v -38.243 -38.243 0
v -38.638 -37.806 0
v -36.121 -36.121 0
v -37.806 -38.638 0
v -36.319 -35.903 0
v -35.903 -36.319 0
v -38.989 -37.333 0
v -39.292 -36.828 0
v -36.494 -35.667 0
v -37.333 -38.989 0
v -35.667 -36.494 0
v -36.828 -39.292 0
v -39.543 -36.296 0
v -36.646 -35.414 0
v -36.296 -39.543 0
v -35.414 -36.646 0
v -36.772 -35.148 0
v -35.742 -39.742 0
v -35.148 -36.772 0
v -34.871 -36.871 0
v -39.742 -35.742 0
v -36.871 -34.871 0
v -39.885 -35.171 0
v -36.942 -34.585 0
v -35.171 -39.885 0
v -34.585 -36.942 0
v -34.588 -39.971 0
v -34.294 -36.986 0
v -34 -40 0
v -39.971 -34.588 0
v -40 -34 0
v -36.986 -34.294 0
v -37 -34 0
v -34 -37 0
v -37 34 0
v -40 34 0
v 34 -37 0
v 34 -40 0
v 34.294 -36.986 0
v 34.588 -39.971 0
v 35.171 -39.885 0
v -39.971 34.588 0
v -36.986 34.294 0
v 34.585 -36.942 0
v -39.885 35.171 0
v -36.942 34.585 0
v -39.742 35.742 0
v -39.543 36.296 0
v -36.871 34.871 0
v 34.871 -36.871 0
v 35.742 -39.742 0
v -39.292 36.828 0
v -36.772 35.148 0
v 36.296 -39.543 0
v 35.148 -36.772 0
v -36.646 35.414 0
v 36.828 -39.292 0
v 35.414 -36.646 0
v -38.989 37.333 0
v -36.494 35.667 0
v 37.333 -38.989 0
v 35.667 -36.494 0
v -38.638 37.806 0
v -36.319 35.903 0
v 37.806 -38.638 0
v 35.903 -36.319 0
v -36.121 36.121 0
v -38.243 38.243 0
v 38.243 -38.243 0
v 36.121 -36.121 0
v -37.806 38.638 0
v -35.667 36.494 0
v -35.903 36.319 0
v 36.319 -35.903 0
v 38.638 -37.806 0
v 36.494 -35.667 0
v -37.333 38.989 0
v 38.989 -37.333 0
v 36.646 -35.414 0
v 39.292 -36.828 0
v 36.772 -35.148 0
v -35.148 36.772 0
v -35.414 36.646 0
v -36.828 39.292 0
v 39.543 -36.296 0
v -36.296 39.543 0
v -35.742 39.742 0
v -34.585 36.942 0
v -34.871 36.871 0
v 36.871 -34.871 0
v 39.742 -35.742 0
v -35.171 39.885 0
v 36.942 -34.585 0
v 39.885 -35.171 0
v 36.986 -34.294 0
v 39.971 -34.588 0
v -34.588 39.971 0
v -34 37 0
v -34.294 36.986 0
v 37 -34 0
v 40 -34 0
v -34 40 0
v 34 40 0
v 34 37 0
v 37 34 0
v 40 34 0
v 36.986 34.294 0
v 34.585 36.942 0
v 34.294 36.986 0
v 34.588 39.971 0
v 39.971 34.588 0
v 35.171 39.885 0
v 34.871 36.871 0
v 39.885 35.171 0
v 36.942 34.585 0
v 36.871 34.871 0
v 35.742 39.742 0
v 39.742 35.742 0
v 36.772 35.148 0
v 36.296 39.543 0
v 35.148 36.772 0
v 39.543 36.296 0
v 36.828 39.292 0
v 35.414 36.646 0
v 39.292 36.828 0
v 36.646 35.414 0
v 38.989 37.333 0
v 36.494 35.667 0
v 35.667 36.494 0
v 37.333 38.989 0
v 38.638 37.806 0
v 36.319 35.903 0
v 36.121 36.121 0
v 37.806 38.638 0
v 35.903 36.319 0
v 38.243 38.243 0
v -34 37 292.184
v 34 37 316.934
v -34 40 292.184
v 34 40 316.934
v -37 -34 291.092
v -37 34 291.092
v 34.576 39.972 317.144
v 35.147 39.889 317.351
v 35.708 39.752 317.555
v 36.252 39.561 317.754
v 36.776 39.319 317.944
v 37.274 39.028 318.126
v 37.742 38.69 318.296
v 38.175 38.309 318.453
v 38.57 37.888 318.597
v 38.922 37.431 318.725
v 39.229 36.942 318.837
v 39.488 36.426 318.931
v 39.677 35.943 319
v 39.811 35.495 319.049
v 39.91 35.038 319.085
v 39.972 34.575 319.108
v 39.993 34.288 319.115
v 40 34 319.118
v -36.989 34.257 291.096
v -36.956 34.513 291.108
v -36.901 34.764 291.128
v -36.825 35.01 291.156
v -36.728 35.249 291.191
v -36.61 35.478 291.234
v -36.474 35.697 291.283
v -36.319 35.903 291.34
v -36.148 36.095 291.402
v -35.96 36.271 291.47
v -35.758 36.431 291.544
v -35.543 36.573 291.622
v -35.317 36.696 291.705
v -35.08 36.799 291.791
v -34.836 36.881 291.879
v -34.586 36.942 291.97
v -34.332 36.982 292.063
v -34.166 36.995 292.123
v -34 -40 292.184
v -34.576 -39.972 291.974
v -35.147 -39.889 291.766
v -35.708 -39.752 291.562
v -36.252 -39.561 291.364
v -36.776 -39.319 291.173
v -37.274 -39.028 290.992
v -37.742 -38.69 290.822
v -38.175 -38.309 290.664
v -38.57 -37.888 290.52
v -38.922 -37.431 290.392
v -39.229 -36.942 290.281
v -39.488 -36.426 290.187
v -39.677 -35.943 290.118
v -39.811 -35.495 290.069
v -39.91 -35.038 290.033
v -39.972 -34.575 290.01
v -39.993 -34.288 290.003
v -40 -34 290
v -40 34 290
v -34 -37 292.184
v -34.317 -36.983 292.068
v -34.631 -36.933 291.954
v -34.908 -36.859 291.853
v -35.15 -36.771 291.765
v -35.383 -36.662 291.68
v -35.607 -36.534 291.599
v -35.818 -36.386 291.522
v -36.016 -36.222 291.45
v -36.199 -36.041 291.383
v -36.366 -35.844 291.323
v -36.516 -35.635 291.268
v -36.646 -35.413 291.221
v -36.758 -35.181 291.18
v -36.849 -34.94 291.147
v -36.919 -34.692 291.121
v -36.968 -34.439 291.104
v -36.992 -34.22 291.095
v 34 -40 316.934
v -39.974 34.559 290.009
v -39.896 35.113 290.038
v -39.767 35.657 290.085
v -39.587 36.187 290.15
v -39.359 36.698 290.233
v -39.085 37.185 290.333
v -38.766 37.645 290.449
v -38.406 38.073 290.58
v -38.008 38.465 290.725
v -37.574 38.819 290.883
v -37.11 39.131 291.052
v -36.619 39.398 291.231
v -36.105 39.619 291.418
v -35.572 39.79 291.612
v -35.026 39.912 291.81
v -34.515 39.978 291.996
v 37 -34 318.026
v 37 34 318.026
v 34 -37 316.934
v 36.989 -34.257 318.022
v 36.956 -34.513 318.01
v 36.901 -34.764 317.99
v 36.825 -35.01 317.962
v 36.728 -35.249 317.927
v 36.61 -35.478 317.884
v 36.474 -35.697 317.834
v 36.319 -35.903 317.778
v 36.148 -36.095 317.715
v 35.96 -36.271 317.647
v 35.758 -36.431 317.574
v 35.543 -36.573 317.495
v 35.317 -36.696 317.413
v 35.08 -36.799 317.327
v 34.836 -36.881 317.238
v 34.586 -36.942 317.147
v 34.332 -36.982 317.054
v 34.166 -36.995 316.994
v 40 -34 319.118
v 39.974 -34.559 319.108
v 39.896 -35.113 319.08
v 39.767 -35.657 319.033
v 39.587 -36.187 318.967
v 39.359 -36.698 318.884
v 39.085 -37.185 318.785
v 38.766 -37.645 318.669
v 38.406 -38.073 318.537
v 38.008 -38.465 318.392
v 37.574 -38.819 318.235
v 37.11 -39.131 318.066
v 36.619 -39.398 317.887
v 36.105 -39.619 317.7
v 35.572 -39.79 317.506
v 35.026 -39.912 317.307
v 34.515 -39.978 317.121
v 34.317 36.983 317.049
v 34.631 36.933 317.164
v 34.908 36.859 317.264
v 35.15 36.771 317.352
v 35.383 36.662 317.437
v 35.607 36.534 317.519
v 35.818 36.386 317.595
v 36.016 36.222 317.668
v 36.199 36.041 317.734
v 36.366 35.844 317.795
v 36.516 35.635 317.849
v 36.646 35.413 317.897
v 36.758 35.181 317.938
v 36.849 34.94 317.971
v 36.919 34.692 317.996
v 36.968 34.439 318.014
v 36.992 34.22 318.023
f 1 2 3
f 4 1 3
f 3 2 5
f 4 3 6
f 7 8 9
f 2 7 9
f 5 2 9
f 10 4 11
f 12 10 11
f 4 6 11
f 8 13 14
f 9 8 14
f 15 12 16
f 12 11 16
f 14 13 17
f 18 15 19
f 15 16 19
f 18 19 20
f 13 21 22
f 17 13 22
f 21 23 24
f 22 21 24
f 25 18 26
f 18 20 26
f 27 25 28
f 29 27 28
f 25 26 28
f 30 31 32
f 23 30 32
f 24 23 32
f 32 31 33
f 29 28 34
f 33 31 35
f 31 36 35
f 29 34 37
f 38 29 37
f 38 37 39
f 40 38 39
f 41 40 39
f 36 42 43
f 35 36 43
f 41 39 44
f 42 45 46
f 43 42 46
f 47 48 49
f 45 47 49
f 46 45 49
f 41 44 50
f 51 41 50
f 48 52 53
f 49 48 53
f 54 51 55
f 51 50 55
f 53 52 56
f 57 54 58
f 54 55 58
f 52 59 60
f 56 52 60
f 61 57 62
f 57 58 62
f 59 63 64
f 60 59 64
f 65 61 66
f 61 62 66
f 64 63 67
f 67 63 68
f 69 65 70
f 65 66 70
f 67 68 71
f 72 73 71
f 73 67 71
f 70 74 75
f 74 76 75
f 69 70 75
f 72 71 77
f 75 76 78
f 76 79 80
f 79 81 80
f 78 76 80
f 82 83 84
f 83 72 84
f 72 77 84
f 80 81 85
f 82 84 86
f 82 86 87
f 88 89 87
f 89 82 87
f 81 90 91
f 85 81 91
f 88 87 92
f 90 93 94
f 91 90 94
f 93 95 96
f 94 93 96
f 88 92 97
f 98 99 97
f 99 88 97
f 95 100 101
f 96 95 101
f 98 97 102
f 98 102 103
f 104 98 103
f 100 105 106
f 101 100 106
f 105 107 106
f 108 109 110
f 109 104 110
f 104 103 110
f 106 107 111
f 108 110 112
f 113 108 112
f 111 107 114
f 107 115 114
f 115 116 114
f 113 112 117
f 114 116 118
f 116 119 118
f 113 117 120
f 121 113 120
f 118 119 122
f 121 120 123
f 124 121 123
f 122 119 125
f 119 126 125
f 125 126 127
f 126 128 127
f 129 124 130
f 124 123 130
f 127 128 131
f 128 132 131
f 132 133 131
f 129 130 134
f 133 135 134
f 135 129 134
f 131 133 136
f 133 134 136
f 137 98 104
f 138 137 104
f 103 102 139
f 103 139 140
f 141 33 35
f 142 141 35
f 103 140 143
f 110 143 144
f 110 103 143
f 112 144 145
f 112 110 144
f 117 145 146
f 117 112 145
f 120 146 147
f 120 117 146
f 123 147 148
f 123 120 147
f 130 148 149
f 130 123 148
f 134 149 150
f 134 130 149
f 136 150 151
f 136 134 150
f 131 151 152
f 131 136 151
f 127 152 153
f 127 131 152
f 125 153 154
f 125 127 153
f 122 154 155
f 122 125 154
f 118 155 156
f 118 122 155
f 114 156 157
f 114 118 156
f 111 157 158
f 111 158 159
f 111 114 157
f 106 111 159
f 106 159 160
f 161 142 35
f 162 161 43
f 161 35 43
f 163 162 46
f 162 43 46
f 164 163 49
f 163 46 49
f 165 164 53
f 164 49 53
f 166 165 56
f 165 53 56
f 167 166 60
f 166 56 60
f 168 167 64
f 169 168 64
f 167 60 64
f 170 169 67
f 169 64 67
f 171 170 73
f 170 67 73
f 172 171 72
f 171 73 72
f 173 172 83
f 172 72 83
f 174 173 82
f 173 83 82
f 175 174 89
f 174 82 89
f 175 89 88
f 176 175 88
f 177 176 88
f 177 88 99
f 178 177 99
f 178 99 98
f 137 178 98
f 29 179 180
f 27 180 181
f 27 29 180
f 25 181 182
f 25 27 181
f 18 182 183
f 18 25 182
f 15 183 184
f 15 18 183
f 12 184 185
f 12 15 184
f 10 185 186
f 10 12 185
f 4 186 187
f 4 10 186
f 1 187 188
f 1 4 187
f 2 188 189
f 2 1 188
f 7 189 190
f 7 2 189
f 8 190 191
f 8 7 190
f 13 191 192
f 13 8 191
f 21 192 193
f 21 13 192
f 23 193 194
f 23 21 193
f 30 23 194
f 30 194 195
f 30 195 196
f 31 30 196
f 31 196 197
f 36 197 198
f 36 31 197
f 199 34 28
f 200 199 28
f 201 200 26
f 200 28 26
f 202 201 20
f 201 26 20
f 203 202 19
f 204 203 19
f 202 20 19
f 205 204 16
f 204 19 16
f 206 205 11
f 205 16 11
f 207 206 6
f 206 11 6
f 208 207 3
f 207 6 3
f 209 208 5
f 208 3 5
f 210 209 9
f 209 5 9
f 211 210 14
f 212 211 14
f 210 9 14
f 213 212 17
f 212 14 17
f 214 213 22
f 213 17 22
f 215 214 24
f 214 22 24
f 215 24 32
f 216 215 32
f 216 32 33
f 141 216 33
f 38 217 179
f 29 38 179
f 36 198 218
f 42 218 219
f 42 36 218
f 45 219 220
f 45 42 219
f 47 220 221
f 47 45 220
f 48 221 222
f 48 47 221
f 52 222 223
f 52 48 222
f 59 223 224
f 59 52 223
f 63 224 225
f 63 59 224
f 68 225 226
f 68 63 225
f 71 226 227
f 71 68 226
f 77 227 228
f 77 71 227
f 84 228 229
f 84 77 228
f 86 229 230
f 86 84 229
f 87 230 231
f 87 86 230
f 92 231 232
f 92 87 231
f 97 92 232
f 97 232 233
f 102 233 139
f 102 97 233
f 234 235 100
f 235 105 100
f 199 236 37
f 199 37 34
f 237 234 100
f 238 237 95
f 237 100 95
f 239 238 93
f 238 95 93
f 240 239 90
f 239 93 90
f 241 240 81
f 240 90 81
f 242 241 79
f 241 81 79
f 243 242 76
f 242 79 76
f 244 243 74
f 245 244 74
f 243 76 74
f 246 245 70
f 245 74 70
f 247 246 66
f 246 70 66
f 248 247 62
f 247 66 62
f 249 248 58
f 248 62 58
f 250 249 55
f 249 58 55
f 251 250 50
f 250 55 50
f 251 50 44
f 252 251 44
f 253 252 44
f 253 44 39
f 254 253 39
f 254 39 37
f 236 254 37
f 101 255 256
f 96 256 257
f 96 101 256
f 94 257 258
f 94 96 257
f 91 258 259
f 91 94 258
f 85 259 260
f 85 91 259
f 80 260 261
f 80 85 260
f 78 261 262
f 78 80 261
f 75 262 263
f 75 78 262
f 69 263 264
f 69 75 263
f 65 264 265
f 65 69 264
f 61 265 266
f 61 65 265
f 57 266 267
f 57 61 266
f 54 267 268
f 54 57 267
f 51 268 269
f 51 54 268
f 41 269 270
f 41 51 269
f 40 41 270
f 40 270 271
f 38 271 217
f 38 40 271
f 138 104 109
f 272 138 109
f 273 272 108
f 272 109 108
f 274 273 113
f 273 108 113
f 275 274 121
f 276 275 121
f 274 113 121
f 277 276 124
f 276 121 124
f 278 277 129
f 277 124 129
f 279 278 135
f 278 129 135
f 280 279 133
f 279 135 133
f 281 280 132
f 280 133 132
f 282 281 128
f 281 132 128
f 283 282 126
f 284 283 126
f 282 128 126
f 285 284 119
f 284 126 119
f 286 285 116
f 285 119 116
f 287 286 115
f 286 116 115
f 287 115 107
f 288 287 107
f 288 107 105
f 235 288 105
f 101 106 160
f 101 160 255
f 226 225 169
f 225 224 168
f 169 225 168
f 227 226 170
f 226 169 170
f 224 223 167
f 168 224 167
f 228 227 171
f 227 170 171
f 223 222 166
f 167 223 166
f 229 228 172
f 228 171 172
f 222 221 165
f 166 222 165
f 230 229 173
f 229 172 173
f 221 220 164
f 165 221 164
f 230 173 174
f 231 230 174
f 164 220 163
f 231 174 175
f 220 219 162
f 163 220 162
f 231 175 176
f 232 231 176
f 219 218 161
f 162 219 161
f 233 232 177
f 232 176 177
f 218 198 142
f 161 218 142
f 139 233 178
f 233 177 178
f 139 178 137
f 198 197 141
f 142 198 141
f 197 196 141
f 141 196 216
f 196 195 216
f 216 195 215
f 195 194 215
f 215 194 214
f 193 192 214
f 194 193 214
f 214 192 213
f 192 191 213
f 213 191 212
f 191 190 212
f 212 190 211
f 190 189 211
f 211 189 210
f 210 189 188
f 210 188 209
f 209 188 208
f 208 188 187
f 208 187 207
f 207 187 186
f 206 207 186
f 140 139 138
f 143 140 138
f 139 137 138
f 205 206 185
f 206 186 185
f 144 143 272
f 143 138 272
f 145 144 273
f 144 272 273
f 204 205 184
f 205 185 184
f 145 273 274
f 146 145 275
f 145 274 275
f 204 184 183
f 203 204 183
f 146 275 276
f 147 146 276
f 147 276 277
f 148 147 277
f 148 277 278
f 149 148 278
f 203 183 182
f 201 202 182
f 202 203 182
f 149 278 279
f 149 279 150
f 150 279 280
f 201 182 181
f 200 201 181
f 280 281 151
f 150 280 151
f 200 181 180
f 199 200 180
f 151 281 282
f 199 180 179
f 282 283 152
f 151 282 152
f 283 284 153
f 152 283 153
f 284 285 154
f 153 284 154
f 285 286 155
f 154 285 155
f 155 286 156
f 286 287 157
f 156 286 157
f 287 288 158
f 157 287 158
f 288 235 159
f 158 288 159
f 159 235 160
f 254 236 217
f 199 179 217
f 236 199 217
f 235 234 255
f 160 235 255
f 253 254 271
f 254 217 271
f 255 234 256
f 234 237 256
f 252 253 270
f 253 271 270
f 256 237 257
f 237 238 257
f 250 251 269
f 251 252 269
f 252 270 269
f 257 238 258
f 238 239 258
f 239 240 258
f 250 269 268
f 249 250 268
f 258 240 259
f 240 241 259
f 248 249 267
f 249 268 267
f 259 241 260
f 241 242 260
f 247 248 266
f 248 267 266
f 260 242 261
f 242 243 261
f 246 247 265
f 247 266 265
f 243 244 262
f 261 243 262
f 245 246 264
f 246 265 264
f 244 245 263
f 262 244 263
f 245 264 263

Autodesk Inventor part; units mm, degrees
ref_plane "YZ Plane" through (0, 0, 0) normal (1, 0, 0) x (0, 1, 0)
ref_plane "Start plane" through (0, 0, 0) normal (0, 0, 1) x (1, 0, 0)
ref_plane "End plane" through (0, 0, 1000) normal (0, 0, 1) x (1, 0, 0)
sketch "Sketch" plane through (0, 0, 0) normal (0, 0, 1) x (1, 0, 0)
  line L0 (-40, -34) -> (-40, 34)
  line L1 (-34, 40) -> (34, 40)
  line L2 (40, 34) -> (40, -34)
  line L3 (34, -40) -> (-34, -40)
  arc A0 (-40, -34) -> (-34, -40) centre (-34, -34) ccw
  arc A1 (40, 34) -> (34, 40) centre (34, 34) ccw
  arc A2 (-34, 40) -> (-40, 34) centre (-34, 34) ccw
  arc A3 (34, -40) -> (40, -34) centre (34, -34) ccw
  arc A4 (-34, 37) -> (-37, 34) centre (-34, 34) ccw
  line L4 (-34, 37) -> (34, 37)
  arc A5 (37, 34) -> (34, 37) centre (34, 34) ccw
  line L5 (37, 34) -> (37, -34)
  arc A6 (34, -37) -> (37, -34) centre (34, -34) ccw
  line L6 (34, -37) -> (-34, -37)
  arc A7 (-37, -34) -> (-34, -37) centre (-34, -34) ccw
  line L7 (-37, -34) -> (-37, 34)
  line L8 (0, 57.7397) -> (0, -57.7397) construction
  line L9 (-57.7397, 0) -> (57.7397, 0) construction
  dimension "d7" = 6
  dimension "d9" = 80
  dimension "d11" = 80
  dimension "d12" = 3
  dimension "d15" = 40
  dimension "d16" = 40
extrude "Body" add sketch "Sketch" along normal up to surface (1000 mm away) from surface at 0
sketch "Sketch3" plane through (0, 0, 0) normal (0, 0, 1) x (1, 0, 0)
  line L0 (0, 0) -> (10, 0)
ref_plane "Work Plane3" through (0, 0, 0) normal (0, -1, 0) x (1, 0, 0)
sketch "Sketch7" plane through (0, 0, 0) normal (0, 1, 0) x (-1, 0, 0)
  line L0 (40, 0) -> (40, 1000) projected
  line L1 (-40, 0) -> (-40, 1000) projected
  line L2 (40, 290) -> (-40, 319.1176)
  line L3 (-40, 1000) -> (-34, 1000) projected
  line L4 (40, 1000) -> (-40, 1000)
  point P0 (0, 0)
  dimension "d37" = 290
  dimension "d38" = 70
extrude "Extrusion3" cut sketch "Sketch7" along normal through all both and the other way through all
sketch "Sketch4" plane through (0, 0, 0) normal (0, -1, 0) x (1, 0, 0)
  line L0 (-2, 0) -> (12, 0) projected
  line L1 (-2, 1000) -> (12, 1000) projected
  dimension "d18" = 1000
equation "\"d7\" = G_IR"
equation "\"d9\" = G_W"
equation "\"d11\" = G_H"
equation "\"d12\" = G_T"
equation "\"d15\" = 0.5 * d9"
equation "\"d16\" = 0.5 * d11"
equation "\"d3\" = G_L"
equation "\"G_W\" = 80"
equation "\"G_H\" = 80"
equation "\"G_T\" = 3"
equation "\"G_IR\" = 6"
equation "\"G_L\" = d18"
equation "\"G_OFFSET_START\" = 0"
equation "\"G_OFFSET_END\" = 0"
properties part number "PRS 940-91 Leg tube" material "Steel, Mild"
